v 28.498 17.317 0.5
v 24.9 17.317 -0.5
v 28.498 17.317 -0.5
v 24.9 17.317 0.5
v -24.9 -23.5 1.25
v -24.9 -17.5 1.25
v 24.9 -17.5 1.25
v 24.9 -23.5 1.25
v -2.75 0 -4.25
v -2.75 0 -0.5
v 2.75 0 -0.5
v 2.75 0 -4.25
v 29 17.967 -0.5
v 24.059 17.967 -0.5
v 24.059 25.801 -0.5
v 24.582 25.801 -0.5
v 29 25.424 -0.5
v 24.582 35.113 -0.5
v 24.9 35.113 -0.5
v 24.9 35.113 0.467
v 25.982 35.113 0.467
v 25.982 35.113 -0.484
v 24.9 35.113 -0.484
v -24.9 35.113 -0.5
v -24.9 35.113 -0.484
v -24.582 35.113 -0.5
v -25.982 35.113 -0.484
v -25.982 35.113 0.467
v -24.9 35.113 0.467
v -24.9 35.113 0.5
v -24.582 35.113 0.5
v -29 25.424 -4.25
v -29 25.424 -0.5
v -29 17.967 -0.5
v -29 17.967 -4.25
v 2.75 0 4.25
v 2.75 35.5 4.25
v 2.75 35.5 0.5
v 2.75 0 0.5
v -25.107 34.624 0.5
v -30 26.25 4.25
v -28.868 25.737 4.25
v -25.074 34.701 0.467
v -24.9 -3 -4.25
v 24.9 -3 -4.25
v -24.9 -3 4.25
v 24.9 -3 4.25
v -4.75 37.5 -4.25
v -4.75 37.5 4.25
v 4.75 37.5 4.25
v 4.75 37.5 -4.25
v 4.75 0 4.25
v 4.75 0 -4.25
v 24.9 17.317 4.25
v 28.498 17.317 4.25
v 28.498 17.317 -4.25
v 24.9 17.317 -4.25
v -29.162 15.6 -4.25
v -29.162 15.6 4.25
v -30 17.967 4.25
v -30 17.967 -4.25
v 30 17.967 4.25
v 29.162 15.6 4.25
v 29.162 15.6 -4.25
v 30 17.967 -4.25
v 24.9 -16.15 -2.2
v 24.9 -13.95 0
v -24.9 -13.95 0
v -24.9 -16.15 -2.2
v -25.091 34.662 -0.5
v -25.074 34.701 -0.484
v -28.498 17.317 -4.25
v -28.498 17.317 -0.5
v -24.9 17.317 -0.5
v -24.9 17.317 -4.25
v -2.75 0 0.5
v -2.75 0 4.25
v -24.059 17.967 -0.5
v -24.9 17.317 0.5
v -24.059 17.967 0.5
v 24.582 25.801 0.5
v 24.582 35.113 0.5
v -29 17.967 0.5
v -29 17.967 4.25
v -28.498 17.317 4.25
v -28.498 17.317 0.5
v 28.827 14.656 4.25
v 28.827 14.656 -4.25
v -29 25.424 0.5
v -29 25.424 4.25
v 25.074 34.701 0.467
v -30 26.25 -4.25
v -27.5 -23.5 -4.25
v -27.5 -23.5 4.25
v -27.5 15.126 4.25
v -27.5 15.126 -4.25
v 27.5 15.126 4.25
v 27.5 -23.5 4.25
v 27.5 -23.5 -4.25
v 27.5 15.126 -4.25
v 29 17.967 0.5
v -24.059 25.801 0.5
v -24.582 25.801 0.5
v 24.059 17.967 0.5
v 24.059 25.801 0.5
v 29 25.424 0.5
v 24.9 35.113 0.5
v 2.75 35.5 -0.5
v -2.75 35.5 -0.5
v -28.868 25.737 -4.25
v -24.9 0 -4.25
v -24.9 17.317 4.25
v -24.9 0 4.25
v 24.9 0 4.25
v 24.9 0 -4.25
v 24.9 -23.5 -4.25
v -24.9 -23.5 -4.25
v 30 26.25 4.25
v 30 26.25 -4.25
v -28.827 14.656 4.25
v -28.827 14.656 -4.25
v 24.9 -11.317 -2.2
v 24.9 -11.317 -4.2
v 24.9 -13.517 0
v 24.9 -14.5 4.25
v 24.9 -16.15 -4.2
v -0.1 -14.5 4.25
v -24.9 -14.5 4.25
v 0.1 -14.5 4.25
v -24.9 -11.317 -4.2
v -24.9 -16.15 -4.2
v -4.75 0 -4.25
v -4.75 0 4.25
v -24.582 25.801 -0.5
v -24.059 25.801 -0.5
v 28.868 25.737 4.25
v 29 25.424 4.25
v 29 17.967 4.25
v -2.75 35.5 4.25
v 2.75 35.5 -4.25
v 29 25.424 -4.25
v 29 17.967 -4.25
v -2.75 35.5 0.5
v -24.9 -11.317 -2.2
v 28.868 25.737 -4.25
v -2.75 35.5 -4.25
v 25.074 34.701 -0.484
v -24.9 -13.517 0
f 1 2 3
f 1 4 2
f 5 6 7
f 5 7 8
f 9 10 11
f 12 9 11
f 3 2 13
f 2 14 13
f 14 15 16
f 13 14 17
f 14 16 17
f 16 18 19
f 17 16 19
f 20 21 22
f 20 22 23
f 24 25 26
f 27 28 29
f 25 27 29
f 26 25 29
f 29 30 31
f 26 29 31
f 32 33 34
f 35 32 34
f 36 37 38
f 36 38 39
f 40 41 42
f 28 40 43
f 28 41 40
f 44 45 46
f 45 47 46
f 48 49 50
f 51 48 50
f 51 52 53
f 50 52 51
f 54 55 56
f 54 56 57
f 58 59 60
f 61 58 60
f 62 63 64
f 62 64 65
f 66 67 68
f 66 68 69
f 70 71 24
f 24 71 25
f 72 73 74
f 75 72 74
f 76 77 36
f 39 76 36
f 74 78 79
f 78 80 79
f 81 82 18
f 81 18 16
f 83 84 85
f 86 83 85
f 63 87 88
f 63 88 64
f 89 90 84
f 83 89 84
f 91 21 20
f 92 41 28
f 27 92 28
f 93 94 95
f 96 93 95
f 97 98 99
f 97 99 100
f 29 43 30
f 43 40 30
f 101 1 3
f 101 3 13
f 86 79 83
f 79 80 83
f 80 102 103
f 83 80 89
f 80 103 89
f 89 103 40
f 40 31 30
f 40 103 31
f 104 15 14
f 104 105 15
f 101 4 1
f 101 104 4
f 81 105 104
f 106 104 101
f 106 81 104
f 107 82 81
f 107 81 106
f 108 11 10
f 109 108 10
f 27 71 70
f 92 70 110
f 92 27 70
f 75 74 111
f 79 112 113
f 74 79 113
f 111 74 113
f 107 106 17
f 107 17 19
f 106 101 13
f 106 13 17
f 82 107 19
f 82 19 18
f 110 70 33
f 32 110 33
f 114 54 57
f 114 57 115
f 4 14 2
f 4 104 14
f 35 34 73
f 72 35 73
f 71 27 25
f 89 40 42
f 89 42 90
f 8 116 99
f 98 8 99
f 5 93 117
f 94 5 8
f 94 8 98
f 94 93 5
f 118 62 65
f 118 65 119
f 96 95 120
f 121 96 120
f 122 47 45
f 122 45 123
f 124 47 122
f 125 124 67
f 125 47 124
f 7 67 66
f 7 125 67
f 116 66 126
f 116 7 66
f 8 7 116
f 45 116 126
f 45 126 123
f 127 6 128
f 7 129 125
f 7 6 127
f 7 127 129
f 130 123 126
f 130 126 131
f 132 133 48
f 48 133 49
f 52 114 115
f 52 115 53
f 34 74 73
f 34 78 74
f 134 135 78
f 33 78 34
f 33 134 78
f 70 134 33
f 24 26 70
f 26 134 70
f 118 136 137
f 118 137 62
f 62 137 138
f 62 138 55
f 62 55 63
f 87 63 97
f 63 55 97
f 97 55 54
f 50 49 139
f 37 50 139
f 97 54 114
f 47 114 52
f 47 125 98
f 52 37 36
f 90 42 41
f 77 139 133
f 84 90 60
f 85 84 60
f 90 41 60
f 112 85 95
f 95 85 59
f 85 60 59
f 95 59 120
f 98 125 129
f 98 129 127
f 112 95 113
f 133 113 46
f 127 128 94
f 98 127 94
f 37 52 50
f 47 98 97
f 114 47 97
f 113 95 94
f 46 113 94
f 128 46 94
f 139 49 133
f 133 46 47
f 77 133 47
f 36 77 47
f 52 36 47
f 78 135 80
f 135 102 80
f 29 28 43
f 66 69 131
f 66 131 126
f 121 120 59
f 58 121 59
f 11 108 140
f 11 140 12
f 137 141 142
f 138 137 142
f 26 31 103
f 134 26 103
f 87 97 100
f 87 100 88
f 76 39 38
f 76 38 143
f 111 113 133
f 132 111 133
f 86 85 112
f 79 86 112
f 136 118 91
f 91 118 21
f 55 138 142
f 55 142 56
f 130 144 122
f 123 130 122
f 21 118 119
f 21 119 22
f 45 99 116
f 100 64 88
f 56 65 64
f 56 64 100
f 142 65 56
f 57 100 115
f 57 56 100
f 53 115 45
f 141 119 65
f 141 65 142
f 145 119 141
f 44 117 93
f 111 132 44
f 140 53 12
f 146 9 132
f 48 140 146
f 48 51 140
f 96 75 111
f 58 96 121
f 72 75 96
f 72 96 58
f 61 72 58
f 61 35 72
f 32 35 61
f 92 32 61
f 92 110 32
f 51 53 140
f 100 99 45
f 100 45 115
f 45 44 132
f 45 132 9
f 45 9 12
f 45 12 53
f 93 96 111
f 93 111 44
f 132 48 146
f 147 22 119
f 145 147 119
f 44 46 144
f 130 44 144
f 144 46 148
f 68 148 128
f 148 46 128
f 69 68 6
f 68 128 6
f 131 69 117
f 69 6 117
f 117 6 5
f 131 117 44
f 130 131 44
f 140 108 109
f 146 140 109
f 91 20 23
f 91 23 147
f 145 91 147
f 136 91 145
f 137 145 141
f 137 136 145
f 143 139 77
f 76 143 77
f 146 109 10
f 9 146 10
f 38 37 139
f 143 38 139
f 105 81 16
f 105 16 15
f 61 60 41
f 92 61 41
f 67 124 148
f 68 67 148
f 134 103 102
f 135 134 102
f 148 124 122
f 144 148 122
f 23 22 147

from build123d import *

# Parameters (mm, degrees)
F0_W        = 2.75
F0_H        = 35.5
F1_DEPTH    = 0.5
F2_DEPTH    = 4.25
F0_W_2      = 24.9
F0_H_2      = 3
F0_H_3      = 2.0327672064
F3_DEPTH    = 2.2
F4_T1_DEPTH = 30.8148708723
F5_W        = 9
F5_H        = 3
F6_DEPTH    = 25
F7_SIZE     = 2.99999
F8_DEPTH    = 2
F10_DEPTH   = 15
F11_DEPTH   = 25


# Not quite as in the source:
# - a fillet or chamfer that OpenCascade refuses, or shapes differently, is made with other operations: its cross-section is extruded or revolved along the edge and cut away or added
# - a fillet or chamfer is up to 0.001 mm smaller than in the source, because OpenCascade refuses the exact size


with BuildPart() as f1:
    # F0 (on Top) → F1 (new body, symmetric)
    with BuildSketch(Plane.XY):
        with Locations((1.375, 17.75)):
            Rectangle(F0_W, F0_H)
    extrude(amount=F1_DEPTH, both=True)

    # F0 (on Top) → F2 (join, symmetric)
    with BuildSketch(Plane.XY):
        Polygon((2.75, 35.5), (2.75, 0), (4.75, 0), (4.75, 37.5), (0, 37.5), (0, 35.5), align=None)
        Polygon((2.75, 0), (0, 0), (0, -3), (24.9, -3), (27.5, -3), (27.5, 0), (24.9, 0), (4.75, 0), align=None)
        Polygon((24.9, 15.6), (24.9, 0), (27.5, 0), (27.5, 15.1257448723), (27.5, 15.6), align=None)
        Polygon((27.5, -3), (24.9, -3), (24.9, -11.2172327936), (24.9, -13.25), (24.9, -16.25), (24.9, -23.5), (27.5, -23.5), align=None)
        Polygon((24.9, 17.3165686429), (24.9, 15.6), (27.5, 15.6), (29.1618686169, 15.6), (30, 17.9667025805), (30, 26.25), (25.9822437406, 35.1126976311), (24.9, 35.1126976311), (29, 25.4238011199), (29, 17.9667025805), (28.4976893067, 17.3165686429), align=None)
        Polygon((27.5, 15.6), (27.5, 15.1257448723), (28.8274421366, 14.6556516198), (29.1618686169, 15.6), align=None)
    extrude(amount=F2_DEPTH, both=True)

    # F0 (on Top) → F3 (join)
    with BuildSketch(Plane.XY):
        with Locations((12.45, -14.75)):
            Rectangle(F0_W_2, F0_H_2)
        with Locations((12.45, -12.2336163968)):
            Rectangle(F0_W_2, F0_H_3)
    extrude(amount=-F3_DEPTH)

    # F4: chamfer of 2.3 on 2 edges, made by hand

    # F4_s2 → F4_t1 (cut)
    with BuildSketch(Plane.YZ.offset(-5.9148708723)):
        Polygon((-13.95, 0), (-16.25, -2.3), (-16.25, 0), align=None)
        Polygon((-13.5172327936, 0), (-11.2172327936, -2.3), (-11.2172327936, 0), align=None)
    extrude(amount=F4_T1_DEPTH, mode=Mode.SUBTRACT)

    # F5 (on face) → F6 (join)
    with BuildSketch(Plane(origin=(24.9, 0, 0), x_dir=(0, -1, 0), z_dir=(-1, 0, 0))):
        with Locations((19, 2.75)):
            Rectangle(F5_W, F5_H)
    extrude(amount=F6_DEPTH)

    # F7 (size 3 in the source; OpenCascade refuses exactly that, so slightly less here)
    f7_edges = [f1.edges().sort_by_distance(p)[0] for p in [
        (12.4, -14.5, 1.25),
    ]]
    chamfer(f7_edges, length=F7_SIZE)

    # F8 (add): a face of the model
    f8_faces = [f1.faces().sort_by_distance(p)[0] for p in [
        (12.45, -13.7336163968, -2.2),
    ]]
    extrude(f8_faces, amount=F8_DEPTH)

    # F9 (on face) → F10 (cut)
    with BuildSketch(Plane(origin=(34.7570417343, 15.7565255862, 0), x_dir=(-0.4128877946, 0.9107818998, 0), z_dir=(0.9107818998, 0.4128877946, 0))):
        Polygon((21.2522581403, 4.25), (11.521391033, 4.25), (21.2522581403, 0.467358419), align=None)
        Polygon((21.2522581403, -0.4835649452), (11.521391033, -4.25), (21.2522581403, -4.25), align=None)
    extrude(amount=-F10_DEPTH, mode=Mode.SUBTRACT)

    # F11 (cut): faces of the model
    f11_faces = [f1.faces().sort_by_distance(p)[0] for p in [
        (25.5282194828, 34.9068733009, 2.3586792095),
        (25.5282194828, 34.9068733009, -2.3667824726),
    ]]
    extrude(f11_faces, amount=-F11_DEPTH, mode=Mode.SUBTRACT)

    # F12: F1, F1b across plane


with BuildPart() as f1b:
    # F0 (on Top) → F1, piece 2 (new body, symmetric)
    with BuildSketch(Plane.XY):
        Polygon((24.9, 35.1126976311), (24.9, 17.3165686429), (28.4976893067, 17.3165686429), (29, 17.9667025805), (29, 25.4238011199), align=None)
        Polygon((24.0585404363, 17.9667025805), (24.9, 17.3165686429), (24.9, 35.1126976311), (24.5823226869, 35.1126976311), (24.5823226869, 25.8005261421), (24.0585404363, 25.8005261421), align=None)
    extrude(amount=F1_DEPTH, both=True)


with BuildPart() as f1_1:
    add(f1.part)
    add(f1.part.mirror(Plane.YZ))
    add(f1b.part.mirror(Plane.YZ))


solid = Compound([f1b.part, f1_1.part])
